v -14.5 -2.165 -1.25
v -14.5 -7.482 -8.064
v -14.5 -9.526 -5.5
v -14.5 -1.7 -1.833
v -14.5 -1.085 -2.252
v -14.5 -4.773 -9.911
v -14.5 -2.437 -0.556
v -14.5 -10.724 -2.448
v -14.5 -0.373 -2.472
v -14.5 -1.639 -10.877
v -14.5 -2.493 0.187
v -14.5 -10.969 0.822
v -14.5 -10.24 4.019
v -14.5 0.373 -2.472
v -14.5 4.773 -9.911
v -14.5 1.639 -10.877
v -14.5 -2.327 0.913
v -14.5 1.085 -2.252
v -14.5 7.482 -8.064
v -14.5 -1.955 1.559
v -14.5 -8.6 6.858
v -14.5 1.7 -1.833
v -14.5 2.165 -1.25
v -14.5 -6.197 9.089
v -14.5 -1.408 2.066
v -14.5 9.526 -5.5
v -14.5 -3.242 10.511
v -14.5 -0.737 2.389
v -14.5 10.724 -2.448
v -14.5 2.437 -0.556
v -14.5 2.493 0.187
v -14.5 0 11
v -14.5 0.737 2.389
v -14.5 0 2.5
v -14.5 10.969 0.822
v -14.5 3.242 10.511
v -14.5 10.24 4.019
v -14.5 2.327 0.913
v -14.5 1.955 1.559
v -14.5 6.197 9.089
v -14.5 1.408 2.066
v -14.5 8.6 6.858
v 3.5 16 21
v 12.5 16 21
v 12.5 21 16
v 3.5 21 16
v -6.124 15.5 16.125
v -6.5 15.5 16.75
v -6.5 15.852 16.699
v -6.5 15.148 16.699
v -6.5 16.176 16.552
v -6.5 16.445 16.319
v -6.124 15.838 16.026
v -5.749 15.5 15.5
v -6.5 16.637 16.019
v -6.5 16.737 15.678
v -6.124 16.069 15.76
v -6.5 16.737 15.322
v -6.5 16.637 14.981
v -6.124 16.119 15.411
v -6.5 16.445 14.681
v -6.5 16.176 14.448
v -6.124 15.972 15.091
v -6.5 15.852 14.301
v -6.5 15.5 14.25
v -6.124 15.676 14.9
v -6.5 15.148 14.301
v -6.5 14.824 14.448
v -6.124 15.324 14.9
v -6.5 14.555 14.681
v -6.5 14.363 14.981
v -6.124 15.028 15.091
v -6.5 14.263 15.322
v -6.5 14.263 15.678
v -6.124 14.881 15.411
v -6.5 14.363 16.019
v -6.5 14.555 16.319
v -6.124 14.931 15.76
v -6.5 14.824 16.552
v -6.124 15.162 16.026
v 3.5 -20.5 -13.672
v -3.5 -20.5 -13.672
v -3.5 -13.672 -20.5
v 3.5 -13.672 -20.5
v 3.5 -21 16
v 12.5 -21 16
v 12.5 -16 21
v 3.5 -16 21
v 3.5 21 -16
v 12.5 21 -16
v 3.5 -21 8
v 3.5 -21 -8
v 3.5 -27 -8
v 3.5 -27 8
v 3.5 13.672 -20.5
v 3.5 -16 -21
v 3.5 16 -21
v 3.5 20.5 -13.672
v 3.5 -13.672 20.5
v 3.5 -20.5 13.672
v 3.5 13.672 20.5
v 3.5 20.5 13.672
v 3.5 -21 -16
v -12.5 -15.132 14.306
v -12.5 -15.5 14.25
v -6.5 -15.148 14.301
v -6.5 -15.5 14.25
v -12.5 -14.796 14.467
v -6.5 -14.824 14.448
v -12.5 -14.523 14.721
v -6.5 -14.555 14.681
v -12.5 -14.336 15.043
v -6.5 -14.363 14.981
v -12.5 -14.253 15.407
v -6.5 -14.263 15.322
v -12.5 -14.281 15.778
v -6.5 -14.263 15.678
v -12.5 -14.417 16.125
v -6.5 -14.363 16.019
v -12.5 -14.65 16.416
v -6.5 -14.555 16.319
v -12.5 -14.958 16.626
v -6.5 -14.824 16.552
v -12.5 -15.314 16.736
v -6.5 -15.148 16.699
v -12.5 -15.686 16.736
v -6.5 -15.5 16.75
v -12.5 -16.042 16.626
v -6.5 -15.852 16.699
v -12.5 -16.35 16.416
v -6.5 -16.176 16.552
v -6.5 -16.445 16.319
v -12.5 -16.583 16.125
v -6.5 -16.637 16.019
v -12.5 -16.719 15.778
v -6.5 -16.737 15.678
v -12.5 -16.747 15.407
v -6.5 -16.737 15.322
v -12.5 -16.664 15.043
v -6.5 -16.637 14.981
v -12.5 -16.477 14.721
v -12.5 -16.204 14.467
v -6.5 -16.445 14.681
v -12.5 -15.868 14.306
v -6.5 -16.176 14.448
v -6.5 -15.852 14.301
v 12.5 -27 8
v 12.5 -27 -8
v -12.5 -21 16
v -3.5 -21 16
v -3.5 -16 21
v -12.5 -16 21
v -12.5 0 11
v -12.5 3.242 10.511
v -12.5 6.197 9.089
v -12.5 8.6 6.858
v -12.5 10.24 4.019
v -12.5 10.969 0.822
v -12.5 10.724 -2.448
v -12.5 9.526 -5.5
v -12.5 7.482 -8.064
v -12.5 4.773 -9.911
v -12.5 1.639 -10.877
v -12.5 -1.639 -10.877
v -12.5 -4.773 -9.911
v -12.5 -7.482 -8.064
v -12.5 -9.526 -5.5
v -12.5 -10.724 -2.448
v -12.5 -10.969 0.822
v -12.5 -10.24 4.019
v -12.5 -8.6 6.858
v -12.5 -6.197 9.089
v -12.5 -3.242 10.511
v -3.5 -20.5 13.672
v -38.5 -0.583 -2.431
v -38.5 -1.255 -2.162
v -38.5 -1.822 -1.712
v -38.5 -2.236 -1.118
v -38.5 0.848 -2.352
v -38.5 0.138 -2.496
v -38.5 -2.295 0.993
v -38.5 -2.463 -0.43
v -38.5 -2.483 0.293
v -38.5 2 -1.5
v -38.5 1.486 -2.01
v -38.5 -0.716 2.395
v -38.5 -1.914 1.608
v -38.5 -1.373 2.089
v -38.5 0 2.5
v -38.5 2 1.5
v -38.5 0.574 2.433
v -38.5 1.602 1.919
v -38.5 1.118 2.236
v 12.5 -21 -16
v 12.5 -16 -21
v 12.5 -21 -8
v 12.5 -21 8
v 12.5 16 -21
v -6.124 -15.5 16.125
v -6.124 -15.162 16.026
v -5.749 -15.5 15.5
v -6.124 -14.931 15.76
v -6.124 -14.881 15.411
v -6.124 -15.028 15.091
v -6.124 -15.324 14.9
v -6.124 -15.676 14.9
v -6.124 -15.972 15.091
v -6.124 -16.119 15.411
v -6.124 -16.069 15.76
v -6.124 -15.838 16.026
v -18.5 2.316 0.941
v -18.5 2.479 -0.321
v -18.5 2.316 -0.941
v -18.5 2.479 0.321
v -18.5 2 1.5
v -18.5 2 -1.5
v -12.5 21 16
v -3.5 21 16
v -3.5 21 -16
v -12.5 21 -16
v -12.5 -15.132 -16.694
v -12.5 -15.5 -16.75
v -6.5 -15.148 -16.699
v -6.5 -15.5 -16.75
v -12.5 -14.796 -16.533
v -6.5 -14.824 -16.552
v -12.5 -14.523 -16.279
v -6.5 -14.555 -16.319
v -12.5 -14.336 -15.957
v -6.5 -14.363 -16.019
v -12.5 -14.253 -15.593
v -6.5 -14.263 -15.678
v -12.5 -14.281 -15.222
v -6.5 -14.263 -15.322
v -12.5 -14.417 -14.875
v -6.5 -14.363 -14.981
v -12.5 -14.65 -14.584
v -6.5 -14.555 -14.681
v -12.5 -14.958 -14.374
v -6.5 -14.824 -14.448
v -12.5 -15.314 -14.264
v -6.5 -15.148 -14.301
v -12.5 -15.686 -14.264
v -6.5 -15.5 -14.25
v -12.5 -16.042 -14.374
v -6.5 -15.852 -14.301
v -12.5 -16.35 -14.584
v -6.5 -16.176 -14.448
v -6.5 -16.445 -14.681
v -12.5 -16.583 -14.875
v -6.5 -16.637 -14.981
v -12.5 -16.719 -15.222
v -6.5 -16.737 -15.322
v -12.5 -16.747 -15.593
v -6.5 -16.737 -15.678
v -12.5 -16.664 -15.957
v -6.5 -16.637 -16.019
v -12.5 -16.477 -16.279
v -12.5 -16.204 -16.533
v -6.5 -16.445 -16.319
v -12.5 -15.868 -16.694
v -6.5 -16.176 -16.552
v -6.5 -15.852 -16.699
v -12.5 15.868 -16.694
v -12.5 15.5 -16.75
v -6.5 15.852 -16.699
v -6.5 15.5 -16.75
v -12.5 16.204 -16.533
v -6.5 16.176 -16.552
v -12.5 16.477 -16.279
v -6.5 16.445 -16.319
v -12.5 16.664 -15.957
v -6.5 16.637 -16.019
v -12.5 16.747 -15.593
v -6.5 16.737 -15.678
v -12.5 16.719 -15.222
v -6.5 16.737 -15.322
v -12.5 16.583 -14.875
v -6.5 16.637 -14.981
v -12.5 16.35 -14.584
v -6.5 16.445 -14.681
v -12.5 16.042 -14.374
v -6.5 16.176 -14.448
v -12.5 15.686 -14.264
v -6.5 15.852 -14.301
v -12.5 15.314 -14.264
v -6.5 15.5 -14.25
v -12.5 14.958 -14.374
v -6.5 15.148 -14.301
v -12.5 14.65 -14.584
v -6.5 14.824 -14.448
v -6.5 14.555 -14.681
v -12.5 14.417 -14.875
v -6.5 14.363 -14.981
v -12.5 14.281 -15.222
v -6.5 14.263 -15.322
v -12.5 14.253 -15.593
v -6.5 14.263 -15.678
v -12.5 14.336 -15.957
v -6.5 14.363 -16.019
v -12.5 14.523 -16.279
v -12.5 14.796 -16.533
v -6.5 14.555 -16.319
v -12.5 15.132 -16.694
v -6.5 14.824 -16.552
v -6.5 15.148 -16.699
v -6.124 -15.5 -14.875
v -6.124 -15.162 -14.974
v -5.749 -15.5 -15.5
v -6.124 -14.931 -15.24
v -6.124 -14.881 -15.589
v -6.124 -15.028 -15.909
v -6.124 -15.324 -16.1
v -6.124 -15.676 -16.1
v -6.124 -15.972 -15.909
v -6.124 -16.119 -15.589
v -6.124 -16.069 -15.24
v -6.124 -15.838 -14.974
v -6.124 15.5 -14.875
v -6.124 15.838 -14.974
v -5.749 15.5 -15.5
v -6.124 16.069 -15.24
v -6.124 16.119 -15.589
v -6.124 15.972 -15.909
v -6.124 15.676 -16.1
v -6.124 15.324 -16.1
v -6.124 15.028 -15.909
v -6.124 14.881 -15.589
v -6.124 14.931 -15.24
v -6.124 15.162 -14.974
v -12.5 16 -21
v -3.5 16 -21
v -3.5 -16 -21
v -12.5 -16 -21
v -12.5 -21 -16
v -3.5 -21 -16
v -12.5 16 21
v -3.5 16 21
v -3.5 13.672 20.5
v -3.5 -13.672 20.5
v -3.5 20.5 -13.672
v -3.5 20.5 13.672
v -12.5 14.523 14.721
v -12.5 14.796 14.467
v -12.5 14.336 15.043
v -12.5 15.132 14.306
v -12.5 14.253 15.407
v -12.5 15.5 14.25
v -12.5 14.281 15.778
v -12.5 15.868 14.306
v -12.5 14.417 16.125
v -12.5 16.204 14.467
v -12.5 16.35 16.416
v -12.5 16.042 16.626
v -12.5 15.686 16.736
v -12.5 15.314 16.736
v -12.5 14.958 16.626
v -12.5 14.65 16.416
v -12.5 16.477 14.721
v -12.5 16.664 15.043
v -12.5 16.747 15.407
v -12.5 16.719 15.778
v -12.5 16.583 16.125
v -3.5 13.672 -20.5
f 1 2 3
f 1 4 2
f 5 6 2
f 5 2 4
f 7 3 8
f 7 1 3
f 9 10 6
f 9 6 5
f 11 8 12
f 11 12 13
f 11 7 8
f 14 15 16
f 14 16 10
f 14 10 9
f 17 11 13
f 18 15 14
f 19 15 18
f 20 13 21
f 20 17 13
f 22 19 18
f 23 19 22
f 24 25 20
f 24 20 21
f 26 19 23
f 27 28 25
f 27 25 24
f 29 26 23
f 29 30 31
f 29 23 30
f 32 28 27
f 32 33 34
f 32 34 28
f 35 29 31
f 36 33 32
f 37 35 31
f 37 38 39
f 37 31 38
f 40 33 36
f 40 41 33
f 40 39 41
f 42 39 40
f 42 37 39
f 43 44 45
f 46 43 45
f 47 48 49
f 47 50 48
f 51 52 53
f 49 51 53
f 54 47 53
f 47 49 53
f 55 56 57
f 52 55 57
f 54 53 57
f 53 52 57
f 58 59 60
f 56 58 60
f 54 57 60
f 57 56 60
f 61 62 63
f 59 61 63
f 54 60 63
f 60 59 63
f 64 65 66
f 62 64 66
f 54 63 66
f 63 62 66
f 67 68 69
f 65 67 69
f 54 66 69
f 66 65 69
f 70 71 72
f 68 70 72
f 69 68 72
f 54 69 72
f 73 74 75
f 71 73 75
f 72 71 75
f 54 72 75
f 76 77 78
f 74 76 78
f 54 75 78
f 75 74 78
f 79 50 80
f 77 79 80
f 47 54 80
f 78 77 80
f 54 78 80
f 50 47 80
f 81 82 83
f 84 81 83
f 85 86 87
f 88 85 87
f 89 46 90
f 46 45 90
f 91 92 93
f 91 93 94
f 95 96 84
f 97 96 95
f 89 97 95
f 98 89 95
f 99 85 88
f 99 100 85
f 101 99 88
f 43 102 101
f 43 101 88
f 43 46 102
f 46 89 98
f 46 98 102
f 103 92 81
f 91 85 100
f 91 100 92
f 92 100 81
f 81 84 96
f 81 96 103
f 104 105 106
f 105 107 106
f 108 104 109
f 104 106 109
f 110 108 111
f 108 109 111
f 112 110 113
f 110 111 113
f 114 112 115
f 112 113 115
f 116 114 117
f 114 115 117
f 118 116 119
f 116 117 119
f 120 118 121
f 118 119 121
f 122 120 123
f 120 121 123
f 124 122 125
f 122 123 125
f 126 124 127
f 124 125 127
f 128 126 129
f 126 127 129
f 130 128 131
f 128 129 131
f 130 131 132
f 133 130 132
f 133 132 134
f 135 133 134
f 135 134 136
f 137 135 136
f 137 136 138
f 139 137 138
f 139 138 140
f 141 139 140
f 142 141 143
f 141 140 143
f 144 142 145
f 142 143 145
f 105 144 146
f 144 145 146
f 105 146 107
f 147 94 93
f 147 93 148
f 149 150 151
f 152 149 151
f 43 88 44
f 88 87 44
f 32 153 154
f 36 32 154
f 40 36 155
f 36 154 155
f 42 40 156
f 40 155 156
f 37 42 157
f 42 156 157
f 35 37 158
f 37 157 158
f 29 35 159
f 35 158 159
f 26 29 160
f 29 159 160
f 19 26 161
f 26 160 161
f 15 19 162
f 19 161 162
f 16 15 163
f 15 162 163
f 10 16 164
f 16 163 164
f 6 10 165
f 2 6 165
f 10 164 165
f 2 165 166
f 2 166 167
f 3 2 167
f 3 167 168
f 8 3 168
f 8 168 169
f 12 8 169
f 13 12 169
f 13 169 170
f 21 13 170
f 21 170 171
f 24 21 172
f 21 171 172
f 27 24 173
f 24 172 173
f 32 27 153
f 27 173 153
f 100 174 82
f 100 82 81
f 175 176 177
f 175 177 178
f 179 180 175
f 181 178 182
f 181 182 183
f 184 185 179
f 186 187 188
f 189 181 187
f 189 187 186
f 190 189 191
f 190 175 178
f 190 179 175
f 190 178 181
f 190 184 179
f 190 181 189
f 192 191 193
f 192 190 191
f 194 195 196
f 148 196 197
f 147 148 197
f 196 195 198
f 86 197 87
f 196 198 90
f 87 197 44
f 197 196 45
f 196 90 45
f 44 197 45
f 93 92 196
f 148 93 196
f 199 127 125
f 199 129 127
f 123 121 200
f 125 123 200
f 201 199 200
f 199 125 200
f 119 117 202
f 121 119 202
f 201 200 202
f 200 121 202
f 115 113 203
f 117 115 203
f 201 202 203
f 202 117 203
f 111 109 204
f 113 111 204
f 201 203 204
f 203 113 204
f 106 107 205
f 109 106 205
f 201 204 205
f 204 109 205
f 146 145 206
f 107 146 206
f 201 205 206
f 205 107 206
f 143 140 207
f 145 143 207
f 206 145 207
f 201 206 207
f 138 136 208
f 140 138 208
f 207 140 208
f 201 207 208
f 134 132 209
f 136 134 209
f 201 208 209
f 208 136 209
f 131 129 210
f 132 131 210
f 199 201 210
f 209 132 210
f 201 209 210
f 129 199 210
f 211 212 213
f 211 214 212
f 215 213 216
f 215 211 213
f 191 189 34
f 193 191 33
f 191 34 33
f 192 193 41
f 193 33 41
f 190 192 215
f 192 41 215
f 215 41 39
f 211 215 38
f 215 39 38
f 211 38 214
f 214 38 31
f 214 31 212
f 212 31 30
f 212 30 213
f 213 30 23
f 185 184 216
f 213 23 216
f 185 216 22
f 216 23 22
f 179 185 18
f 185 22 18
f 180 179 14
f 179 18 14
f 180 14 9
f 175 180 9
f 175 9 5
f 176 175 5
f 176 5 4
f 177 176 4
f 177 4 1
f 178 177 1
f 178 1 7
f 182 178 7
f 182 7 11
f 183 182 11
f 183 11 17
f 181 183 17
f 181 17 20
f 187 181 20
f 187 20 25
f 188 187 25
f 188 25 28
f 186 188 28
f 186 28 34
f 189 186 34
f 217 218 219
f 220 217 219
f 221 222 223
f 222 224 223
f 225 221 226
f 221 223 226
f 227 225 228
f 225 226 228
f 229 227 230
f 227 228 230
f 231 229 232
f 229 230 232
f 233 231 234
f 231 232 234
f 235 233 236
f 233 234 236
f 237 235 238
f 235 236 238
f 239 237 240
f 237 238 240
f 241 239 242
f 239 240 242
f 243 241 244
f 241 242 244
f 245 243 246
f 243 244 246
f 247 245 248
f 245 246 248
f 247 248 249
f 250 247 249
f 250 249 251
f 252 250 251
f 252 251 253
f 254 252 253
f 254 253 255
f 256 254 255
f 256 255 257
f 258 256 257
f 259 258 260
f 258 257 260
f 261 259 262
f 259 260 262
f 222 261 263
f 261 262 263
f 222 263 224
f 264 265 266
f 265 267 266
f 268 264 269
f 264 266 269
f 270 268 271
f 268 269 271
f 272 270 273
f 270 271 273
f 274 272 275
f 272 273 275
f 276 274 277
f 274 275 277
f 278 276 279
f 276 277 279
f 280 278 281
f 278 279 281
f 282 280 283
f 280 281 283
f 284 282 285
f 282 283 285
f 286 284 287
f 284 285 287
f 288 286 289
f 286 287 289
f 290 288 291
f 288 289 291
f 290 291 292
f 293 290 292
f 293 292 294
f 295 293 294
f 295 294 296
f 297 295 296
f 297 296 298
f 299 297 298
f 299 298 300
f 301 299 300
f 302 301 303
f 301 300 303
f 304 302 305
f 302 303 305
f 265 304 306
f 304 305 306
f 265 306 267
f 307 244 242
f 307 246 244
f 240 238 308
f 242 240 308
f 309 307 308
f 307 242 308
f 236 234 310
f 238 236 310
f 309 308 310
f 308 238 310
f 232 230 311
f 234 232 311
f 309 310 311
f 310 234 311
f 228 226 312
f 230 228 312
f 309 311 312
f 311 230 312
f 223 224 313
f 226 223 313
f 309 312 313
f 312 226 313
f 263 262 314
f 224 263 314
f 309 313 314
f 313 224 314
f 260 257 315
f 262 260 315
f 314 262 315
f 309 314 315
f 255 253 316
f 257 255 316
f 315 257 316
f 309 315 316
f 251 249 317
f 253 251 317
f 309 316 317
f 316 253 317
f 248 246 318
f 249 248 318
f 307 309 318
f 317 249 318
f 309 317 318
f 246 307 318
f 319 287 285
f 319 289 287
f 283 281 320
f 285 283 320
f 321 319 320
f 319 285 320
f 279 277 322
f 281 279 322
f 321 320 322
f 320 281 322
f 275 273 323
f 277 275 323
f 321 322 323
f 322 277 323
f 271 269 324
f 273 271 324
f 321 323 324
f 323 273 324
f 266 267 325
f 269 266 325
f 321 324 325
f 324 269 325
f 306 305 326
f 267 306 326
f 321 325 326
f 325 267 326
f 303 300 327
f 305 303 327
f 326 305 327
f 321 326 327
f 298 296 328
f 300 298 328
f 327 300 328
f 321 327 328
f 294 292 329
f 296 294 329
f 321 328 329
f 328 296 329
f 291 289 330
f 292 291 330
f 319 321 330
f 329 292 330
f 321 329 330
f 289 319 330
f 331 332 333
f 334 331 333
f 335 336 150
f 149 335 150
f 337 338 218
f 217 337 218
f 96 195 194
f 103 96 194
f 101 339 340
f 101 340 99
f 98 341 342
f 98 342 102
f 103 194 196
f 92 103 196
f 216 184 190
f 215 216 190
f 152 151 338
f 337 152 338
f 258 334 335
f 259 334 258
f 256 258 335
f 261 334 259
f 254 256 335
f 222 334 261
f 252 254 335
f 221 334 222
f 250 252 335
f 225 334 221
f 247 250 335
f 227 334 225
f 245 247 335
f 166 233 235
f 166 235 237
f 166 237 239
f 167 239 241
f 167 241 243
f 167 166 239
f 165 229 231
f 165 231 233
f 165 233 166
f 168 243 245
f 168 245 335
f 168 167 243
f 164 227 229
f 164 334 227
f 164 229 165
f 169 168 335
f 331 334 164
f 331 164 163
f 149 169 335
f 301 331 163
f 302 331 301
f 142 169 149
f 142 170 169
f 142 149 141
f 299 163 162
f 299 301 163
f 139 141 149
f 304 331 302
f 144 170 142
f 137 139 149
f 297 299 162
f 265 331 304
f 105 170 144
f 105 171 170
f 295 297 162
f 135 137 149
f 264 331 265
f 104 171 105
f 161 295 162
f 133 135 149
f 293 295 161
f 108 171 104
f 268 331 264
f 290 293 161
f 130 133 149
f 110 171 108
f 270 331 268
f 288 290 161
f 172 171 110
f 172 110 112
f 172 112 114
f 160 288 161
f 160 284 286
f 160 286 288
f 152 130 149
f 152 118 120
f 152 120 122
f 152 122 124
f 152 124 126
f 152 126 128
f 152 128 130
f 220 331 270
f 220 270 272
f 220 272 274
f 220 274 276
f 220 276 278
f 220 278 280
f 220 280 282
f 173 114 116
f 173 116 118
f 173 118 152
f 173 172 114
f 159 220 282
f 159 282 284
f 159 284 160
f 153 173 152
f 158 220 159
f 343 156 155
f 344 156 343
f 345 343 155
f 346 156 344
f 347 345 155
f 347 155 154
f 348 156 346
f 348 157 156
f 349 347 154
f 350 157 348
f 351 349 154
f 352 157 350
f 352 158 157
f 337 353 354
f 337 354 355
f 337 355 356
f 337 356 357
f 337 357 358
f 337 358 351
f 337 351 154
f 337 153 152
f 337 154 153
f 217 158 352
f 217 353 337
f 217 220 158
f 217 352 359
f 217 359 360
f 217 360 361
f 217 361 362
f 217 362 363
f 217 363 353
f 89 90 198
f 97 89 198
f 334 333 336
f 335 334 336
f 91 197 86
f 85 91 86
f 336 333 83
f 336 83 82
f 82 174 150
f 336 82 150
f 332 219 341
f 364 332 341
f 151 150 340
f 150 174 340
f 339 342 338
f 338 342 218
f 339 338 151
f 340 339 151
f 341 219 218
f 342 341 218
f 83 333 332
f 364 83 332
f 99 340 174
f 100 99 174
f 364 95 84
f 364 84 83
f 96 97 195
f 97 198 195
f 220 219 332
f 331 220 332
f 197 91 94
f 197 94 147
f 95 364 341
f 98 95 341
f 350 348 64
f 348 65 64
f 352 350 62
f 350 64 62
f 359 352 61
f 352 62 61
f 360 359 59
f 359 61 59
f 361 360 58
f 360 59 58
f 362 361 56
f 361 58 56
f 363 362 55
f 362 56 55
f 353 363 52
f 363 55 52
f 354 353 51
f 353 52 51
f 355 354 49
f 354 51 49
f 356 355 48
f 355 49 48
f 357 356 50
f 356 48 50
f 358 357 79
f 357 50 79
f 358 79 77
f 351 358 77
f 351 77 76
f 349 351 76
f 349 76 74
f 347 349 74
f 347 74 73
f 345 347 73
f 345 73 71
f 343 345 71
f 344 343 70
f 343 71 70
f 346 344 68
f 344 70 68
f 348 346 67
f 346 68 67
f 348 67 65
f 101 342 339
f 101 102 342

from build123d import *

# Parameters (mm, degrees)
BOSS_EXTRUDE1_DEPTH   = 12.5
CUT_EXTRUDE1_DEPTH    = 3.5
SKETCH4_W             = 7
SKETCH4_H             = 27.34314575
CUT_EXTRUDE2_DEPTH    = 0.5
SKETCH5_W             = 7
SKETCH5_H             = 27.34314575
CUT_EXTRUDE3_DEPTH    = 0.5
SKETCH6_W             = 7
SKETCH6_H             = 27.34314575
CUT_EXTRUDE4_DEPTH    = 0.5
SKETCH7_W             = 7
SKETCH7_H             = 27.34314575
CUT_EXTRUDE5_DEPTH    = 0.5
SKETCH8_R             = 11
BOSS_EXTRUDE2_DEPTH   = 2
SKETCH9_R             = 2.5
BOSS_EXTRUDE3_DEPTH   = 24
M3_TAPPED_HOLE1_D     = 2.5
M3_TAPPED_HOLE1_DEPTH = 6
M3_TAPPED_HOLE1_TIP   = 0.751075774
SKETCH12_W            = 3
SKETCH12_H            = 0.5
CUT_EXTRUDE6_DEPTH    = 20
SKETCH13_W            = 9
SKETCH13_H            = 16
BOSS_EXTRUDE4_DEPTH   = 6


with BuildPart() as part:
    # Sketch1 → Boss-Extrude1 (new body, symmetric)
    with BuildSketch(Plane(origin=(0, 0, 0), x_dir=(0, 0, -1), z_dir=(1, 0, 0))):
        Polygon((-21, 16), (-16, 21), (16, 21), (21, 16), (21, -16), (16, -21), (-16, -21), (-21, -16), align=None)
    extrude(amount=BOSS_EXTRUDE1_DEPTH, both=True)

    # Sketch2 → Cut-Extrude1 (cut, symmetric)
    with BuildSketch(Plane(origin=(0, 0, 0), x_dir=(0, 0, -1), z_dir=(1, 0, 0))):
        Polygon((-21, -13.671572875), (-20.5, -13.671572875), (-13.671572875, -20.5), (-13.671572875, -21), (-16, -21), (-21, -16), align=None)
        Polygon((13.671572875, -21), (13.671572875, -20.5), (20.5, -13.671572875), (21, -13.671572875), (21, -16), (16, -21), align=None)
        Polygon((21, 13.671572875), (20.5, 13.671572875), (13.671572875, 20.5), (13.671572875, 21), (16, 21), (21, 16), align=None)
        Polygon((-13.671572875, 21), (-13.671572875, 20.5), (-20.5, 13.671572875), (-21, 13.671572875), (-21, 16), (-16, 21), align=None)
    extrude(amount=CUT_EXTRUDE1_DEPTH, both=True, mode=Mode.SUBTRACT)

    # Sketch4 → Cut-Extrude2 (cut)
    with BuildSketch(Plane.XY.offset(21)):
        Rectangle(SKETCH4_W, SKETCH4_H)
    extrude(amount=-CUT_EXTRUDE2_DEPTH, mode=Mode.SUBTRACT)

    # Sketch5 → Cut-Extrude3 (cut)
    with BuildSketch(Plane(origin=(0, 21, 0), x_dir=(1, 0, 0), z_dir=(0, 1, 0))):
        Rectangle(SKETCH5_W, SKETCH5_H)
    extrude(amount=-CUT_EXTRUDE3_DEPTH, mode=Mode.SUBTRACT)

    # Sketch6 → Cut-Extrude4 (cut)
    with BuildSketch(Plane(origin=(0, 0, -21), x_dir=(-1, 0, 0), z_dir=(0, 0, -1))):
        Rectangle(SKETCH6_W, SKETCH6_H)
    extrude(amount=-CUT_EXTRUDE4_DEPTH, mode=Mode.SUBTRACT)

    # Sketch7 → Cut-Extrude5 (cut)
    with BuildSketch(Plane.XZ.offset(21)):
        Rectangle(SKETCH7_W, SKETCH7_H)
    extrude(amount=-CUT_EXTRUDE5_DEPTH, mode=Mode.SUBTRACT)

    # Sketch8 → Boss-Extrude2 (add)
    with BuildSketch(Plane.ZY.offset(12.5)):
        Circle(SKETCH8_R)
    extrude(amount=BOSS_EXTRUDE2_DEPTH)

    # Sketch9 → Boss-Extrude3 (add)
    with BuildSketch(Plane.ZY.offset(14.5)):
        Circle(SKETCH9_R)
    extrude(amount=BOSS_EXTRUDE3_DEPTH)

    # M3 Tapped Hole1
    with Locations(Plane.ZY.offset(12.5)):
        with Locations((-15.5, 15.5), (15.5, 15.5), (-15.5, -15.5), (15.5, -15.5)):
            Hole(M3_TAPPED_HOLE1_D / 2, depth=M3_TAPPED_HOLE1_DEPTH)
            with Locations((0, 0, -(M3_TAPPED_HOLE1_DEPTH + M3_TAPPED_HOLE1_TIP / 2))):  # 118° drill point
                Cone(0, M3_TAPPED_HOLE1_D / 2, M3_TAPPED_HOLE1_TIP, mode=Mode.SUBTRACT)

    # Sketch12 → Cut-Extrude6 (cut)
    with BuildSketch(Plane.ZY.offset(38.5)):
        with Locations((0, 2.25)):
            Rectangle(SKETCH12_W, SKETCH12_H)
    extrude(amount=-CUT_EXTRUDE6_DEPTH, mode=Mode.SUBTRACT)

    # Sketch13 → Boss-Extrude4 (add)
    with BuildSketch(Plane.XZ.offset(21)):
        with Locations((8, 0)):
            Rectangle(SKETCH13_W, SKETCH13_H)
    extrude(amount=BOSS_EXTRUDE4_DEPTH)


solid = part.part
